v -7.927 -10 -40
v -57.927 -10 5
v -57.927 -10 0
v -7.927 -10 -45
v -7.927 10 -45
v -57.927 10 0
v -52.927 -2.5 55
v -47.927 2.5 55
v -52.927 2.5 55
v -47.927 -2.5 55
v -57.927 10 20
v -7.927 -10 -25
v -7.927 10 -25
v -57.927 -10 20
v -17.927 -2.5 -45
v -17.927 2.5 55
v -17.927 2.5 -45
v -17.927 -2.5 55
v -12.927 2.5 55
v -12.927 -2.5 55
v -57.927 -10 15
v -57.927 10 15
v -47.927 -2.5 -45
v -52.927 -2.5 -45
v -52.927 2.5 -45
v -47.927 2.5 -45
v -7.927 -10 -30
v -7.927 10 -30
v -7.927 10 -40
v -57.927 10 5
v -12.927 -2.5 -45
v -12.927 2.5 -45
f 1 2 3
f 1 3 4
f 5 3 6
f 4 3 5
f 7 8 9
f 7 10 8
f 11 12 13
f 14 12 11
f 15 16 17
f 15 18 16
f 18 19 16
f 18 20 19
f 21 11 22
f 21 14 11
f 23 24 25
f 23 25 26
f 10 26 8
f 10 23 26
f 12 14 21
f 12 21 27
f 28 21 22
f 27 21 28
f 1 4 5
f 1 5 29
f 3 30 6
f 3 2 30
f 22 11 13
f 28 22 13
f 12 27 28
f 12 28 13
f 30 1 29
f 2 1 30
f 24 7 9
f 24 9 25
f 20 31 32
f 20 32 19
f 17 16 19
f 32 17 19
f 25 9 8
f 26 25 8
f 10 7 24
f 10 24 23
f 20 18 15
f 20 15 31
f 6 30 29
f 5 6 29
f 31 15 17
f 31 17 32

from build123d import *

# Parameters (mm, degrees)
F1_DEPTH      = 2.5
F1_DEPTH_BACK = 2.5
F2_DEPTH      = 10
F2_DEPTH_BACK = 10


with BuildPart() as f1:
    # F0 (on Front) → F1 (new body, two sides)
    with BuildSketch(Plane.XZ) as f1_sk:
        Polygon((-47.9271147301, 55), (-52.9271147301, 55), (-52.9271147301, 15.5), (-47.9271147301, 11), align=None)
        Polygon((-47.9271147301, -9), (-52.9271147301, -4.5), (-52.9271147301, -45), (-47.9271147301, -45), align=None)
        Polygon((-47.9271147301, 6), (-52.9271147301, 10.5), (-52.9271147301, 0.5), (-47.9271147301, -4), align=None)
        Polygon((-47.9271147301, 11), (-52.9271147301, 15.5), (-52.9271147301, 10.5), (-47.9271147301, 6), align=None)
        Polygon((-47.9271147301, -4), (-52.9271147301, 0.5), (-52.9271147301, -4.5), (-47.9271147301, -9), align=None)
    extrude(amount=F1_DEPTH)
    extrude(f1_sk.sketch, amount=-F1_DEPTH_BACK)


with BuildPart() as f1b:
    # F0 (on Front) → F1, piece 2 (new body, two sides)
    with BuildSketch(Plane.XZ) as f1_2_sk:
        Polygon((-17.9271147301, 55), (-17.9271147301, -16), (-12.9271147301, -20.5), (-12.9271147301, 55), align=None)
        Polygon((-12.9271147301, -40.5), (-17.9271147301, -36), (-17.9271147301, -45), (-12.9271147301, -45), align=None)
        Polygon((-12.9271147301, -25.5), (-17.9271147301, -21), (-17.9271147301, -31), (-12.9271147301, -35.5), align=None)
        Polygon((-12.9271147301, -20.5), (-17.9271147301, -16), (-17.9271147301, -21), (-12.9271147301, -25.5), align=None)
        Polygon((-12.9271147301, -35.5), (-17.9271147301, -31), (-17.9271147301, -36), (-12.9271147301, -40.5), align=None)
    extrude(amount=F1_DEPTH)
    extrude(f1_2_sk.sketch, amount=-F1_DEPTH_BACK)


with BuildPart() as f2:
    # F0 (on Front) → F2 (new body, two sides)
    with BuildSketch(Plane.XZ) as f2_sk:
        Polygon((-17.9271147301, -16), (-47.9271147301, 11), (-47.9271147301, 6), (-17.9271147301, -21), align=None)
        Polygon((-52.9271147301, 10.5), (-52.9271147301, 15.5), (-57.9271147301, 20), (-57.9271147301, 15), align=None)
        Polygon((-7.9271147301, -25), (-12.9271147301, -20.5), (-12.9271147301, -25.5), (-7.9271147301, -30), align=None)
        Polygon((-47.9271147301, 11), (-52.9271147301, 15.5), (-52.9271147301, 10.5), (-47.9271147301, 6), align=None)
        Polygon((-12.9271147301, -20.5), (-17.9271147301, -16), (-17.9271147301, -21), (-12.9271147301, -25.5), align=None)
    extrude(amount=F2_DEPTH)
    extrude(f2_sk.sketch, amount=-F2_DEPTH_BACK)


with BuildPart() as f2b:
    # F0 (on Front) → F2, piece 2 (new body, two sides)
    with BuildSketch(Plane.XZ) as f2_2_sk:
        Polygon((-17.9271147301, -31), (-47.9271147301, -4), (-47.9271147301, -9), (-17.9271147301, -36), align=None)
        Polygon((-52.9271147301, -4.5), (-52.9271147301, 0.5), (-57.9271147301, 5), (-57.9271147301, 0), align=None)
        Polygon((-7.9271147301, -40), (-12.9271147301, -35.5), (-12.9271147301, -40.5), (-7.9271147301, -45), align=None)
        Polygon((-47.9271147301, -4), (-52.9271147301, 0.5), (-52.9271147301, -4.5), (-47.9271147301, -9), align=None)
        Polygon((-12.9271147301, -35.5), (-17.9271147301, -31), (-17.9271147301, -36), (-12.9271147301, -40.5), align=None)
    extrude(amount=F2_DEPTH)
    extrude(f2_2_sk.sketch, amount=-F2_DEPTH_BACK)


solid = Compound([f1.part, f1b.part, f2.part, f2b.part])
